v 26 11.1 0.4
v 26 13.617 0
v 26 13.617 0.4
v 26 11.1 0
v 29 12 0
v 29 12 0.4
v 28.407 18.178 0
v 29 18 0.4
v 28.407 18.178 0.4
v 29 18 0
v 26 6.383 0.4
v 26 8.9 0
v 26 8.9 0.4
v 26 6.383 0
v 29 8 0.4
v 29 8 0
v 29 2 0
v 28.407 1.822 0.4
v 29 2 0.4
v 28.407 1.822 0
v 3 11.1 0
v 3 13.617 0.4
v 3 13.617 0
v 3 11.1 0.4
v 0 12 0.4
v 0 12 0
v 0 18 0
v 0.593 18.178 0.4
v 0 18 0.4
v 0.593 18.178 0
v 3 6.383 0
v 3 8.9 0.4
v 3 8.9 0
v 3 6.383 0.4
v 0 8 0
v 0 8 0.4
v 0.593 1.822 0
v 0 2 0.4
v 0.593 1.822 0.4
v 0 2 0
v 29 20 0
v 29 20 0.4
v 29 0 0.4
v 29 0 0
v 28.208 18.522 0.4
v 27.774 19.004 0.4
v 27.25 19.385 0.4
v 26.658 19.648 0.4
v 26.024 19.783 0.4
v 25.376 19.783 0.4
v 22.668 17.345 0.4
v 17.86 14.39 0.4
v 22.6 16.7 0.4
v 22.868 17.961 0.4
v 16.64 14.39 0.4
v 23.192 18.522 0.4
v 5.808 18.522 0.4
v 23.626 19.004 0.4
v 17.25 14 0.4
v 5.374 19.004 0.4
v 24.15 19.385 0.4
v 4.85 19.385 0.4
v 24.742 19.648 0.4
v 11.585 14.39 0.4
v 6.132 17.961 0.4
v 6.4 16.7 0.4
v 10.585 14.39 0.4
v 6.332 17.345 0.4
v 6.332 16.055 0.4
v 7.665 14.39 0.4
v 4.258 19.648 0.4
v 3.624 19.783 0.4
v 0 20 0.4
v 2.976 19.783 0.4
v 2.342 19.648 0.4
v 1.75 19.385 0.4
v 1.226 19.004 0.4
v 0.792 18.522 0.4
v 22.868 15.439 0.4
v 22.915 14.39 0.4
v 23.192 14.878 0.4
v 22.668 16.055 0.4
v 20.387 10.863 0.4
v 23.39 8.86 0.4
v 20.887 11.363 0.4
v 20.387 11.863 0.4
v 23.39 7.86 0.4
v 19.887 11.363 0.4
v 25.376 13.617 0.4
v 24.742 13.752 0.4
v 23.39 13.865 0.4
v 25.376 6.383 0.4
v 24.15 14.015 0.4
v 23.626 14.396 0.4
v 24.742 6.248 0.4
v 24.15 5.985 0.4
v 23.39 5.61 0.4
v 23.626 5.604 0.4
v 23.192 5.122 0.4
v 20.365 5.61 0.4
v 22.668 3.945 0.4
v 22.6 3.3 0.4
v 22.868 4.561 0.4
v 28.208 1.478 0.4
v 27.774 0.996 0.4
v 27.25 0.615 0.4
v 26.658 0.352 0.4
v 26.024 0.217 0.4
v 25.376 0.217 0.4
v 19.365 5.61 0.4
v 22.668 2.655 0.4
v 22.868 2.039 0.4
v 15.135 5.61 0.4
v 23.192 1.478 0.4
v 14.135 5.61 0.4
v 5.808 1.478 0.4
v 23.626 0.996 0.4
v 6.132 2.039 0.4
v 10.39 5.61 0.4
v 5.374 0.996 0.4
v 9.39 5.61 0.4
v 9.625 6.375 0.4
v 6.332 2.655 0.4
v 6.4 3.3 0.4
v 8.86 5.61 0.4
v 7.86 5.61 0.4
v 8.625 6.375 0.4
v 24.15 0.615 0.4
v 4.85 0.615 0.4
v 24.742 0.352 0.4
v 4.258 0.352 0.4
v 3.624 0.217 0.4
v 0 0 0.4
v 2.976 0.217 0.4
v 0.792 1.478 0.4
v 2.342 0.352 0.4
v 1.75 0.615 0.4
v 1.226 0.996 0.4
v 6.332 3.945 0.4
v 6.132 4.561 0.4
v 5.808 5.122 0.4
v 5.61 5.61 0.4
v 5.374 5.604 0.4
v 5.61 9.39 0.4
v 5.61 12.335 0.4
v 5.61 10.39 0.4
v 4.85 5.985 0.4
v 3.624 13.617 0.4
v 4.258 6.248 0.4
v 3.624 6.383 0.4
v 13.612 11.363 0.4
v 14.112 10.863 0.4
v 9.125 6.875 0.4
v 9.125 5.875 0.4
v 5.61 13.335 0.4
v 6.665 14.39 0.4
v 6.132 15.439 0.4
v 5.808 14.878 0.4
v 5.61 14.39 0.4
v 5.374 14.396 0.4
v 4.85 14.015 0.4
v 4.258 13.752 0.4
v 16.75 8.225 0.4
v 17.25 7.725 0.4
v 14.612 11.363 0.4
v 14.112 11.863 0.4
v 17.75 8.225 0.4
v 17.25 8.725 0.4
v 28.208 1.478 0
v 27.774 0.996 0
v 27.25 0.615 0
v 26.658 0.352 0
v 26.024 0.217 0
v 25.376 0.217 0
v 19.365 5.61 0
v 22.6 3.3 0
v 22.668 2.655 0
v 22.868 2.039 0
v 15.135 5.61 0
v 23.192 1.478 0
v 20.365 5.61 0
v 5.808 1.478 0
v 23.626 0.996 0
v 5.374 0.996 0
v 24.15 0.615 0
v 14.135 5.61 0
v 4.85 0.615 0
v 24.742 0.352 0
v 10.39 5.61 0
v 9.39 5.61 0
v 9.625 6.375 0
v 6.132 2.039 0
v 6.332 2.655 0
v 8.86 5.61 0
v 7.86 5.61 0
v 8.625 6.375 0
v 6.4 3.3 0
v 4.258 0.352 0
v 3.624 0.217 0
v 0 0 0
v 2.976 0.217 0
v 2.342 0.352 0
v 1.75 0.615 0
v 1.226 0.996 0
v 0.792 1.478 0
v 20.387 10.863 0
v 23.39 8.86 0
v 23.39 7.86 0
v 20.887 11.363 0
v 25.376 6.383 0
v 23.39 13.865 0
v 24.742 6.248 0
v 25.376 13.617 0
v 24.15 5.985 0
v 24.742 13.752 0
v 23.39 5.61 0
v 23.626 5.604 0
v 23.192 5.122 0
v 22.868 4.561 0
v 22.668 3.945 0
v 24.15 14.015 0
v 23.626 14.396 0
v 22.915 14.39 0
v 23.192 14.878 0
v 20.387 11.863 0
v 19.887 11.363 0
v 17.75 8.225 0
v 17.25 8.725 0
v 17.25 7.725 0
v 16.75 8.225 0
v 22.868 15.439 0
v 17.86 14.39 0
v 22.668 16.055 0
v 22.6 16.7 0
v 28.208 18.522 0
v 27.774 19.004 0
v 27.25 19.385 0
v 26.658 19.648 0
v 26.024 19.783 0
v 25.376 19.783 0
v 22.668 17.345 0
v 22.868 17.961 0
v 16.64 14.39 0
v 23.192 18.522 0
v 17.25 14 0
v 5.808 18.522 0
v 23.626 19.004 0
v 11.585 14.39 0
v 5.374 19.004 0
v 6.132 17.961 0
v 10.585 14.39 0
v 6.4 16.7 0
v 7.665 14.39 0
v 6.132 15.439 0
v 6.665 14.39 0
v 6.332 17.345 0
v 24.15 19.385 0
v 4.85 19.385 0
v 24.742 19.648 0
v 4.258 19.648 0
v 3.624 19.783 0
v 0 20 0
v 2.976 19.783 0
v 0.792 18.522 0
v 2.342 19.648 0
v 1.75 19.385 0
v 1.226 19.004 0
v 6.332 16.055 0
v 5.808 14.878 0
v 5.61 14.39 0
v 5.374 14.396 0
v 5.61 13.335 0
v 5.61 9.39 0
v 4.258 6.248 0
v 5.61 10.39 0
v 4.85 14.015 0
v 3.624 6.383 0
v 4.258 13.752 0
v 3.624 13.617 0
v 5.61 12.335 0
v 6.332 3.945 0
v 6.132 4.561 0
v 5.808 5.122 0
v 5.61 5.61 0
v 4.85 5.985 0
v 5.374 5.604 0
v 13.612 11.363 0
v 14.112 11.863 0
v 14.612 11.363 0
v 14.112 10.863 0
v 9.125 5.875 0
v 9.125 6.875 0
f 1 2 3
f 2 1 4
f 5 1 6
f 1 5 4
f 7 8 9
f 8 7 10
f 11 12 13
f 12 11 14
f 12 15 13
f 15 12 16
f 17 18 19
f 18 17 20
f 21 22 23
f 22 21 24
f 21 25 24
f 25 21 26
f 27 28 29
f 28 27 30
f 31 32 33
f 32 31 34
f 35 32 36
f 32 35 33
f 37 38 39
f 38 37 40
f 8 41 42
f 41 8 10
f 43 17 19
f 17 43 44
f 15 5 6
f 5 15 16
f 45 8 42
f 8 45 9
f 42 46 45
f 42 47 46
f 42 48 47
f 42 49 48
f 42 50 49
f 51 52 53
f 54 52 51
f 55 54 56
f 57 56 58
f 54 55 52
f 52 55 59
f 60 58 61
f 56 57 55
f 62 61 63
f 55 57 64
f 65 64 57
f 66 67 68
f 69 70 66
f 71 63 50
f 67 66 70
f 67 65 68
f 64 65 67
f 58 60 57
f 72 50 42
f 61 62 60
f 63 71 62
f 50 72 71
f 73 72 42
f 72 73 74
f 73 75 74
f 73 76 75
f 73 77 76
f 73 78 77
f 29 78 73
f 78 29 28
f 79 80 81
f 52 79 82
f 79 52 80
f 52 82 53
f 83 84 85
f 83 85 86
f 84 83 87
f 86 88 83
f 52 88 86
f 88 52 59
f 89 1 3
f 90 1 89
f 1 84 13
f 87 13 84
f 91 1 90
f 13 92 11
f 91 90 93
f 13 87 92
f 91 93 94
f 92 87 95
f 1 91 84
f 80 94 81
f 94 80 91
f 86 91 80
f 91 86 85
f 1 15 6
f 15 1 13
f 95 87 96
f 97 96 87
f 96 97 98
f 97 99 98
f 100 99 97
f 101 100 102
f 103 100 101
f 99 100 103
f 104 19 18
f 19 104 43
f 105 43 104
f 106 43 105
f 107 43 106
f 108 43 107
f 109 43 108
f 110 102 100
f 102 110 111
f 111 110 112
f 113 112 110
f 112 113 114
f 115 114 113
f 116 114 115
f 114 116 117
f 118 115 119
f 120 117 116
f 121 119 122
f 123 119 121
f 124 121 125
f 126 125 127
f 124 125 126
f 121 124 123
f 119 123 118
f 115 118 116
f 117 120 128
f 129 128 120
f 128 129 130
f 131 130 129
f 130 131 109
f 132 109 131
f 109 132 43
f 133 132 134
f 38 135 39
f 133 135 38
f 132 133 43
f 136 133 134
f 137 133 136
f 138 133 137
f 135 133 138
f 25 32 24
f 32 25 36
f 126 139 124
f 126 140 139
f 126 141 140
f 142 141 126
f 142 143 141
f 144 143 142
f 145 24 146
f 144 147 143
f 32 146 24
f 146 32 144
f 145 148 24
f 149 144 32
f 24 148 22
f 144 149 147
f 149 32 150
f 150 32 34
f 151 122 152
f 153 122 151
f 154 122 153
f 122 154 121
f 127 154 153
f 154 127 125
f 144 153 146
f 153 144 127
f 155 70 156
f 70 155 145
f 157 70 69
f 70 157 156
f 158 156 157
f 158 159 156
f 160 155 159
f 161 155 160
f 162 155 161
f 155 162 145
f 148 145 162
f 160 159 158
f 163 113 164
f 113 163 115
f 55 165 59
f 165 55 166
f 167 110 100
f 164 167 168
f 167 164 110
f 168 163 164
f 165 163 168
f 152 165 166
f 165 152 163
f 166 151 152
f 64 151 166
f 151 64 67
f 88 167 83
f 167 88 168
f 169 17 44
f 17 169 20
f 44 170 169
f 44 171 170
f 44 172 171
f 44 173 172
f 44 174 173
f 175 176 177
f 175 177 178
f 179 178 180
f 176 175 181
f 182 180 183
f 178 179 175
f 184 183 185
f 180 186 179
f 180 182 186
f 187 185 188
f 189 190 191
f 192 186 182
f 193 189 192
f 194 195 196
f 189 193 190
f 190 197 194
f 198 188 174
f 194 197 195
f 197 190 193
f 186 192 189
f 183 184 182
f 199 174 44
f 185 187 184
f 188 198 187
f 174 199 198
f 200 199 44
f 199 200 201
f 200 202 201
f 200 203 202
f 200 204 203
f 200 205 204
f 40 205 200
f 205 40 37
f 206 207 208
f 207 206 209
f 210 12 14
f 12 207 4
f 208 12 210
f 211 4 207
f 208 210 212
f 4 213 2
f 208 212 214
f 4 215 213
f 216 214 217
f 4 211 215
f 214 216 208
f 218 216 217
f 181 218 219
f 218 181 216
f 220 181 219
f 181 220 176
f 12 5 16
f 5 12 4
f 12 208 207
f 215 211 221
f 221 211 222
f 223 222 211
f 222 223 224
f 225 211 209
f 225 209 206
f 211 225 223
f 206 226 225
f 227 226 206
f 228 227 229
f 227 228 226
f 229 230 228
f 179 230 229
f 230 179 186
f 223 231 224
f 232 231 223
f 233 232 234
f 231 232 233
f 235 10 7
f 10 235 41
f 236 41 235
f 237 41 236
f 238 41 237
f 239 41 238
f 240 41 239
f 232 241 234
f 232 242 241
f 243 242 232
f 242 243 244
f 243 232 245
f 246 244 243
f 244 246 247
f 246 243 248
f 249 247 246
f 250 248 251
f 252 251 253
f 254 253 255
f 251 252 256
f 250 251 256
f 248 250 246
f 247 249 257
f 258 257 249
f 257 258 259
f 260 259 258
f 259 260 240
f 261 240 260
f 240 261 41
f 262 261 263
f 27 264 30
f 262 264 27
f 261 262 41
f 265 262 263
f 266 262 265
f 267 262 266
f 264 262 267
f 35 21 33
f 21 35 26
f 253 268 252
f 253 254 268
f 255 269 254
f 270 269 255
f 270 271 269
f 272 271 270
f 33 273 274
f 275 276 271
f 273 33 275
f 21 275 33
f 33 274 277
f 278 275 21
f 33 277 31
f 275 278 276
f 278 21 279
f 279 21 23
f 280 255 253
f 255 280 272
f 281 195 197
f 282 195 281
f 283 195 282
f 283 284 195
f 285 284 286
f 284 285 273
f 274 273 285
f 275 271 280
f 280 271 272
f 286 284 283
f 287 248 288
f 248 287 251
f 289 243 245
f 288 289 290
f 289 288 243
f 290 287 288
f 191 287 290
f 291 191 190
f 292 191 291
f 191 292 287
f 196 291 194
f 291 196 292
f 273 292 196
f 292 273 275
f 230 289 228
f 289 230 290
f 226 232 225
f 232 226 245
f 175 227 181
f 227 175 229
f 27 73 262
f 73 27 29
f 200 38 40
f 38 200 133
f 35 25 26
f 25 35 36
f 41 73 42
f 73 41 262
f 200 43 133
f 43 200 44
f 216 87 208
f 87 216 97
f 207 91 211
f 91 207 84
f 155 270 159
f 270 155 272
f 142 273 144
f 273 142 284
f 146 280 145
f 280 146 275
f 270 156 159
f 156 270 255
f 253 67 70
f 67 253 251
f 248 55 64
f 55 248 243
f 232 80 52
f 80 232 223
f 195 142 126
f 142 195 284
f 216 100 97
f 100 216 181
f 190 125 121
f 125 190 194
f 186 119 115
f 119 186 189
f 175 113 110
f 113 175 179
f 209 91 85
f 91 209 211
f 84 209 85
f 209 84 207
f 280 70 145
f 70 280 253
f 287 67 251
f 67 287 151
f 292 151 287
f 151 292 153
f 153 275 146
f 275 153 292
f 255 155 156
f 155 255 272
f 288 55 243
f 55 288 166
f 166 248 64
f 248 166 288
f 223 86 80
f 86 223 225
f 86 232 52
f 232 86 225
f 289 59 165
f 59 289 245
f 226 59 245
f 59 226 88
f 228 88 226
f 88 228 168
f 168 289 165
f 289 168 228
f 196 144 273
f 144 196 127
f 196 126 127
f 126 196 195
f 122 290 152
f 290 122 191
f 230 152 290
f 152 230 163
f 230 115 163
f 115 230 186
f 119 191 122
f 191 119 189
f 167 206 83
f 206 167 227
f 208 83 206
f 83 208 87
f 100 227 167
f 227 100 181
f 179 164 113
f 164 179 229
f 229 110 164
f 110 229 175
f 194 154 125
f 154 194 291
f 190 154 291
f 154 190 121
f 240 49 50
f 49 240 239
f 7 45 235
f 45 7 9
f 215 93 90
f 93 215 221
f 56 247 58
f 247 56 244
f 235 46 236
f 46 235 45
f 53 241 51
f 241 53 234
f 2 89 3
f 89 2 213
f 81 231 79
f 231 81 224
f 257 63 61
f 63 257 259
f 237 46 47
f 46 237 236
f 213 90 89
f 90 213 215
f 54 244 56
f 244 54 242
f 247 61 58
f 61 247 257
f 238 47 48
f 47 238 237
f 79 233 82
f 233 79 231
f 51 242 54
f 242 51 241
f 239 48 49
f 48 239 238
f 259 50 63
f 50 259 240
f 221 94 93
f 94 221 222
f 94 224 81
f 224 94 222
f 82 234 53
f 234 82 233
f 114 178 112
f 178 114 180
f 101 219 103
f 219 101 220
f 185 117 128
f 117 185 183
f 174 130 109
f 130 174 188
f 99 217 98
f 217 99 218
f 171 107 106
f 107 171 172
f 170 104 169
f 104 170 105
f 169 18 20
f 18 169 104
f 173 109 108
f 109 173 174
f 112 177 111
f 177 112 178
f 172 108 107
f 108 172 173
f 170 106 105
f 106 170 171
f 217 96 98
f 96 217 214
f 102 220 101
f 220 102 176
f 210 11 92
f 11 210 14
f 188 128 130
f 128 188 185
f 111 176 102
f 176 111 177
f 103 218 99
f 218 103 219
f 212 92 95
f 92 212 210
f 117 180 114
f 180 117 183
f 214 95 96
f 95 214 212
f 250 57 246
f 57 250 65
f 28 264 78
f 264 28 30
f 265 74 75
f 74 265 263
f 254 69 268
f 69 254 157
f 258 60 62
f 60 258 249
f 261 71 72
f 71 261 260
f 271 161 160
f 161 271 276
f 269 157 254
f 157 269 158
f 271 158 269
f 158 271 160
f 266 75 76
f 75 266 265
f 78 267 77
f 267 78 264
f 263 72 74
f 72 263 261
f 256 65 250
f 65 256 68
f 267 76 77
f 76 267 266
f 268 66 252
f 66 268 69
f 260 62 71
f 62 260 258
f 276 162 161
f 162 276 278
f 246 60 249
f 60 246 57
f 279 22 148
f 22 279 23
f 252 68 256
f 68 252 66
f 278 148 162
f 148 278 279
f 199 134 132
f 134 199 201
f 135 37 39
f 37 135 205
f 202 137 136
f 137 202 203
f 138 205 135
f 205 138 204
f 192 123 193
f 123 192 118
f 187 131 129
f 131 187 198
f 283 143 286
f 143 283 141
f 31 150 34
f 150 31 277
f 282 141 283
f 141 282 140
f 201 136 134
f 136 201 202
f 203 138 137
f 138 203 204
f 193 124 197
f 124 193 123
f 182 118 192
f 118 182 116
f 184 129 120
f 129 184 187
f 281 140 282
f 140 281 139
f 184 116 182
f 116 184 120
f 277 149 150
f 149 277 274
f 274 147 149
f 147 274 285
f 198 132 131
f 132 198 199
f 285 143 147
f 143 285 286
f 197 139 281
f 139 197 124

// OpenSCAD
// Lid defaults follow the effective floor, so thin trays retain thin covers.
// Explicit depth overrides remain available. Stack dimensions use the same
// effective lid depth as the geometry.
include <../../release/lib/counter_tray_designer_lib.1.scad>

assert(_get_effective_lid_depth([]) == 1.5);
assert(_get_effective_lid_depth([[G_FLOOR_THICKNESS_N, 0.4]]) == 0.4);
assert(_get_effective_lid_depth([[G_FLOOR_THICKNESS_N, 0.4], [G_LID_DEPTH_N, 2]]) == 2);

globals = [[G_FLOOR_THICKNESS_N, 0.4]];
tray = [TRAY, [G_FLOOR_THICKNESS_N, 0.8],
    [COUNTER_SET, [COUNTER_SIZE_XYZ, [13, 13, 1.2]]]];
assert(_get_effective_lid_depth(build_effective_lid_data([LID], tray, globals)) == 0.8);
assert(_get_effective_lid_depth(build_effective_lid_data([LID, [G_LID_DEPTH_N, 1.1]], tray, globals)) == 1.1);
assert(_get_effective_lid_depth(build_effective_lid_data([LID], tray,
    concat([[G_LID_DEPTH_N, 1.3]], globals))) == 1.3);
assert(_get_effective_lid_depth(build_effective_lid_data([LID],
    [TRAY, [G_LID_DEPTH_N, 1.7]], globals)) == 1.7);

// Two 2 mm trays and one 0.8 mm lid make a 4.8 mm stack.
stack = concat(globals, [[TRAY, [G_FLOOR_THICKNESS_N, 0.8], [PRINT_COUNT_N, 2],
    [COUNTER_SET, [COUNTER_SIZE_XYZ, [13, 13, 1.2]]]], [LID]]);
assert(abs(_get_total_stack_height(stack, get_top_level_globals(stack)) - 4.8) < 0.000001);
// Select either magnet or plain frames when checking the resulting lid mesh.
FRAME = 1;
Make([[G_DIMENSIONS_XY, [29, 20]], [G_FRAME_STYLE_N, FRAME],
    [G_FLOOR_THICKNESS_N, 0.4], [_TRAY_ENABLED_B, false],
    [COUNTER_SET, [COUNTER_SIZE_XYZ, [13, 13, 1.2]]]]);
